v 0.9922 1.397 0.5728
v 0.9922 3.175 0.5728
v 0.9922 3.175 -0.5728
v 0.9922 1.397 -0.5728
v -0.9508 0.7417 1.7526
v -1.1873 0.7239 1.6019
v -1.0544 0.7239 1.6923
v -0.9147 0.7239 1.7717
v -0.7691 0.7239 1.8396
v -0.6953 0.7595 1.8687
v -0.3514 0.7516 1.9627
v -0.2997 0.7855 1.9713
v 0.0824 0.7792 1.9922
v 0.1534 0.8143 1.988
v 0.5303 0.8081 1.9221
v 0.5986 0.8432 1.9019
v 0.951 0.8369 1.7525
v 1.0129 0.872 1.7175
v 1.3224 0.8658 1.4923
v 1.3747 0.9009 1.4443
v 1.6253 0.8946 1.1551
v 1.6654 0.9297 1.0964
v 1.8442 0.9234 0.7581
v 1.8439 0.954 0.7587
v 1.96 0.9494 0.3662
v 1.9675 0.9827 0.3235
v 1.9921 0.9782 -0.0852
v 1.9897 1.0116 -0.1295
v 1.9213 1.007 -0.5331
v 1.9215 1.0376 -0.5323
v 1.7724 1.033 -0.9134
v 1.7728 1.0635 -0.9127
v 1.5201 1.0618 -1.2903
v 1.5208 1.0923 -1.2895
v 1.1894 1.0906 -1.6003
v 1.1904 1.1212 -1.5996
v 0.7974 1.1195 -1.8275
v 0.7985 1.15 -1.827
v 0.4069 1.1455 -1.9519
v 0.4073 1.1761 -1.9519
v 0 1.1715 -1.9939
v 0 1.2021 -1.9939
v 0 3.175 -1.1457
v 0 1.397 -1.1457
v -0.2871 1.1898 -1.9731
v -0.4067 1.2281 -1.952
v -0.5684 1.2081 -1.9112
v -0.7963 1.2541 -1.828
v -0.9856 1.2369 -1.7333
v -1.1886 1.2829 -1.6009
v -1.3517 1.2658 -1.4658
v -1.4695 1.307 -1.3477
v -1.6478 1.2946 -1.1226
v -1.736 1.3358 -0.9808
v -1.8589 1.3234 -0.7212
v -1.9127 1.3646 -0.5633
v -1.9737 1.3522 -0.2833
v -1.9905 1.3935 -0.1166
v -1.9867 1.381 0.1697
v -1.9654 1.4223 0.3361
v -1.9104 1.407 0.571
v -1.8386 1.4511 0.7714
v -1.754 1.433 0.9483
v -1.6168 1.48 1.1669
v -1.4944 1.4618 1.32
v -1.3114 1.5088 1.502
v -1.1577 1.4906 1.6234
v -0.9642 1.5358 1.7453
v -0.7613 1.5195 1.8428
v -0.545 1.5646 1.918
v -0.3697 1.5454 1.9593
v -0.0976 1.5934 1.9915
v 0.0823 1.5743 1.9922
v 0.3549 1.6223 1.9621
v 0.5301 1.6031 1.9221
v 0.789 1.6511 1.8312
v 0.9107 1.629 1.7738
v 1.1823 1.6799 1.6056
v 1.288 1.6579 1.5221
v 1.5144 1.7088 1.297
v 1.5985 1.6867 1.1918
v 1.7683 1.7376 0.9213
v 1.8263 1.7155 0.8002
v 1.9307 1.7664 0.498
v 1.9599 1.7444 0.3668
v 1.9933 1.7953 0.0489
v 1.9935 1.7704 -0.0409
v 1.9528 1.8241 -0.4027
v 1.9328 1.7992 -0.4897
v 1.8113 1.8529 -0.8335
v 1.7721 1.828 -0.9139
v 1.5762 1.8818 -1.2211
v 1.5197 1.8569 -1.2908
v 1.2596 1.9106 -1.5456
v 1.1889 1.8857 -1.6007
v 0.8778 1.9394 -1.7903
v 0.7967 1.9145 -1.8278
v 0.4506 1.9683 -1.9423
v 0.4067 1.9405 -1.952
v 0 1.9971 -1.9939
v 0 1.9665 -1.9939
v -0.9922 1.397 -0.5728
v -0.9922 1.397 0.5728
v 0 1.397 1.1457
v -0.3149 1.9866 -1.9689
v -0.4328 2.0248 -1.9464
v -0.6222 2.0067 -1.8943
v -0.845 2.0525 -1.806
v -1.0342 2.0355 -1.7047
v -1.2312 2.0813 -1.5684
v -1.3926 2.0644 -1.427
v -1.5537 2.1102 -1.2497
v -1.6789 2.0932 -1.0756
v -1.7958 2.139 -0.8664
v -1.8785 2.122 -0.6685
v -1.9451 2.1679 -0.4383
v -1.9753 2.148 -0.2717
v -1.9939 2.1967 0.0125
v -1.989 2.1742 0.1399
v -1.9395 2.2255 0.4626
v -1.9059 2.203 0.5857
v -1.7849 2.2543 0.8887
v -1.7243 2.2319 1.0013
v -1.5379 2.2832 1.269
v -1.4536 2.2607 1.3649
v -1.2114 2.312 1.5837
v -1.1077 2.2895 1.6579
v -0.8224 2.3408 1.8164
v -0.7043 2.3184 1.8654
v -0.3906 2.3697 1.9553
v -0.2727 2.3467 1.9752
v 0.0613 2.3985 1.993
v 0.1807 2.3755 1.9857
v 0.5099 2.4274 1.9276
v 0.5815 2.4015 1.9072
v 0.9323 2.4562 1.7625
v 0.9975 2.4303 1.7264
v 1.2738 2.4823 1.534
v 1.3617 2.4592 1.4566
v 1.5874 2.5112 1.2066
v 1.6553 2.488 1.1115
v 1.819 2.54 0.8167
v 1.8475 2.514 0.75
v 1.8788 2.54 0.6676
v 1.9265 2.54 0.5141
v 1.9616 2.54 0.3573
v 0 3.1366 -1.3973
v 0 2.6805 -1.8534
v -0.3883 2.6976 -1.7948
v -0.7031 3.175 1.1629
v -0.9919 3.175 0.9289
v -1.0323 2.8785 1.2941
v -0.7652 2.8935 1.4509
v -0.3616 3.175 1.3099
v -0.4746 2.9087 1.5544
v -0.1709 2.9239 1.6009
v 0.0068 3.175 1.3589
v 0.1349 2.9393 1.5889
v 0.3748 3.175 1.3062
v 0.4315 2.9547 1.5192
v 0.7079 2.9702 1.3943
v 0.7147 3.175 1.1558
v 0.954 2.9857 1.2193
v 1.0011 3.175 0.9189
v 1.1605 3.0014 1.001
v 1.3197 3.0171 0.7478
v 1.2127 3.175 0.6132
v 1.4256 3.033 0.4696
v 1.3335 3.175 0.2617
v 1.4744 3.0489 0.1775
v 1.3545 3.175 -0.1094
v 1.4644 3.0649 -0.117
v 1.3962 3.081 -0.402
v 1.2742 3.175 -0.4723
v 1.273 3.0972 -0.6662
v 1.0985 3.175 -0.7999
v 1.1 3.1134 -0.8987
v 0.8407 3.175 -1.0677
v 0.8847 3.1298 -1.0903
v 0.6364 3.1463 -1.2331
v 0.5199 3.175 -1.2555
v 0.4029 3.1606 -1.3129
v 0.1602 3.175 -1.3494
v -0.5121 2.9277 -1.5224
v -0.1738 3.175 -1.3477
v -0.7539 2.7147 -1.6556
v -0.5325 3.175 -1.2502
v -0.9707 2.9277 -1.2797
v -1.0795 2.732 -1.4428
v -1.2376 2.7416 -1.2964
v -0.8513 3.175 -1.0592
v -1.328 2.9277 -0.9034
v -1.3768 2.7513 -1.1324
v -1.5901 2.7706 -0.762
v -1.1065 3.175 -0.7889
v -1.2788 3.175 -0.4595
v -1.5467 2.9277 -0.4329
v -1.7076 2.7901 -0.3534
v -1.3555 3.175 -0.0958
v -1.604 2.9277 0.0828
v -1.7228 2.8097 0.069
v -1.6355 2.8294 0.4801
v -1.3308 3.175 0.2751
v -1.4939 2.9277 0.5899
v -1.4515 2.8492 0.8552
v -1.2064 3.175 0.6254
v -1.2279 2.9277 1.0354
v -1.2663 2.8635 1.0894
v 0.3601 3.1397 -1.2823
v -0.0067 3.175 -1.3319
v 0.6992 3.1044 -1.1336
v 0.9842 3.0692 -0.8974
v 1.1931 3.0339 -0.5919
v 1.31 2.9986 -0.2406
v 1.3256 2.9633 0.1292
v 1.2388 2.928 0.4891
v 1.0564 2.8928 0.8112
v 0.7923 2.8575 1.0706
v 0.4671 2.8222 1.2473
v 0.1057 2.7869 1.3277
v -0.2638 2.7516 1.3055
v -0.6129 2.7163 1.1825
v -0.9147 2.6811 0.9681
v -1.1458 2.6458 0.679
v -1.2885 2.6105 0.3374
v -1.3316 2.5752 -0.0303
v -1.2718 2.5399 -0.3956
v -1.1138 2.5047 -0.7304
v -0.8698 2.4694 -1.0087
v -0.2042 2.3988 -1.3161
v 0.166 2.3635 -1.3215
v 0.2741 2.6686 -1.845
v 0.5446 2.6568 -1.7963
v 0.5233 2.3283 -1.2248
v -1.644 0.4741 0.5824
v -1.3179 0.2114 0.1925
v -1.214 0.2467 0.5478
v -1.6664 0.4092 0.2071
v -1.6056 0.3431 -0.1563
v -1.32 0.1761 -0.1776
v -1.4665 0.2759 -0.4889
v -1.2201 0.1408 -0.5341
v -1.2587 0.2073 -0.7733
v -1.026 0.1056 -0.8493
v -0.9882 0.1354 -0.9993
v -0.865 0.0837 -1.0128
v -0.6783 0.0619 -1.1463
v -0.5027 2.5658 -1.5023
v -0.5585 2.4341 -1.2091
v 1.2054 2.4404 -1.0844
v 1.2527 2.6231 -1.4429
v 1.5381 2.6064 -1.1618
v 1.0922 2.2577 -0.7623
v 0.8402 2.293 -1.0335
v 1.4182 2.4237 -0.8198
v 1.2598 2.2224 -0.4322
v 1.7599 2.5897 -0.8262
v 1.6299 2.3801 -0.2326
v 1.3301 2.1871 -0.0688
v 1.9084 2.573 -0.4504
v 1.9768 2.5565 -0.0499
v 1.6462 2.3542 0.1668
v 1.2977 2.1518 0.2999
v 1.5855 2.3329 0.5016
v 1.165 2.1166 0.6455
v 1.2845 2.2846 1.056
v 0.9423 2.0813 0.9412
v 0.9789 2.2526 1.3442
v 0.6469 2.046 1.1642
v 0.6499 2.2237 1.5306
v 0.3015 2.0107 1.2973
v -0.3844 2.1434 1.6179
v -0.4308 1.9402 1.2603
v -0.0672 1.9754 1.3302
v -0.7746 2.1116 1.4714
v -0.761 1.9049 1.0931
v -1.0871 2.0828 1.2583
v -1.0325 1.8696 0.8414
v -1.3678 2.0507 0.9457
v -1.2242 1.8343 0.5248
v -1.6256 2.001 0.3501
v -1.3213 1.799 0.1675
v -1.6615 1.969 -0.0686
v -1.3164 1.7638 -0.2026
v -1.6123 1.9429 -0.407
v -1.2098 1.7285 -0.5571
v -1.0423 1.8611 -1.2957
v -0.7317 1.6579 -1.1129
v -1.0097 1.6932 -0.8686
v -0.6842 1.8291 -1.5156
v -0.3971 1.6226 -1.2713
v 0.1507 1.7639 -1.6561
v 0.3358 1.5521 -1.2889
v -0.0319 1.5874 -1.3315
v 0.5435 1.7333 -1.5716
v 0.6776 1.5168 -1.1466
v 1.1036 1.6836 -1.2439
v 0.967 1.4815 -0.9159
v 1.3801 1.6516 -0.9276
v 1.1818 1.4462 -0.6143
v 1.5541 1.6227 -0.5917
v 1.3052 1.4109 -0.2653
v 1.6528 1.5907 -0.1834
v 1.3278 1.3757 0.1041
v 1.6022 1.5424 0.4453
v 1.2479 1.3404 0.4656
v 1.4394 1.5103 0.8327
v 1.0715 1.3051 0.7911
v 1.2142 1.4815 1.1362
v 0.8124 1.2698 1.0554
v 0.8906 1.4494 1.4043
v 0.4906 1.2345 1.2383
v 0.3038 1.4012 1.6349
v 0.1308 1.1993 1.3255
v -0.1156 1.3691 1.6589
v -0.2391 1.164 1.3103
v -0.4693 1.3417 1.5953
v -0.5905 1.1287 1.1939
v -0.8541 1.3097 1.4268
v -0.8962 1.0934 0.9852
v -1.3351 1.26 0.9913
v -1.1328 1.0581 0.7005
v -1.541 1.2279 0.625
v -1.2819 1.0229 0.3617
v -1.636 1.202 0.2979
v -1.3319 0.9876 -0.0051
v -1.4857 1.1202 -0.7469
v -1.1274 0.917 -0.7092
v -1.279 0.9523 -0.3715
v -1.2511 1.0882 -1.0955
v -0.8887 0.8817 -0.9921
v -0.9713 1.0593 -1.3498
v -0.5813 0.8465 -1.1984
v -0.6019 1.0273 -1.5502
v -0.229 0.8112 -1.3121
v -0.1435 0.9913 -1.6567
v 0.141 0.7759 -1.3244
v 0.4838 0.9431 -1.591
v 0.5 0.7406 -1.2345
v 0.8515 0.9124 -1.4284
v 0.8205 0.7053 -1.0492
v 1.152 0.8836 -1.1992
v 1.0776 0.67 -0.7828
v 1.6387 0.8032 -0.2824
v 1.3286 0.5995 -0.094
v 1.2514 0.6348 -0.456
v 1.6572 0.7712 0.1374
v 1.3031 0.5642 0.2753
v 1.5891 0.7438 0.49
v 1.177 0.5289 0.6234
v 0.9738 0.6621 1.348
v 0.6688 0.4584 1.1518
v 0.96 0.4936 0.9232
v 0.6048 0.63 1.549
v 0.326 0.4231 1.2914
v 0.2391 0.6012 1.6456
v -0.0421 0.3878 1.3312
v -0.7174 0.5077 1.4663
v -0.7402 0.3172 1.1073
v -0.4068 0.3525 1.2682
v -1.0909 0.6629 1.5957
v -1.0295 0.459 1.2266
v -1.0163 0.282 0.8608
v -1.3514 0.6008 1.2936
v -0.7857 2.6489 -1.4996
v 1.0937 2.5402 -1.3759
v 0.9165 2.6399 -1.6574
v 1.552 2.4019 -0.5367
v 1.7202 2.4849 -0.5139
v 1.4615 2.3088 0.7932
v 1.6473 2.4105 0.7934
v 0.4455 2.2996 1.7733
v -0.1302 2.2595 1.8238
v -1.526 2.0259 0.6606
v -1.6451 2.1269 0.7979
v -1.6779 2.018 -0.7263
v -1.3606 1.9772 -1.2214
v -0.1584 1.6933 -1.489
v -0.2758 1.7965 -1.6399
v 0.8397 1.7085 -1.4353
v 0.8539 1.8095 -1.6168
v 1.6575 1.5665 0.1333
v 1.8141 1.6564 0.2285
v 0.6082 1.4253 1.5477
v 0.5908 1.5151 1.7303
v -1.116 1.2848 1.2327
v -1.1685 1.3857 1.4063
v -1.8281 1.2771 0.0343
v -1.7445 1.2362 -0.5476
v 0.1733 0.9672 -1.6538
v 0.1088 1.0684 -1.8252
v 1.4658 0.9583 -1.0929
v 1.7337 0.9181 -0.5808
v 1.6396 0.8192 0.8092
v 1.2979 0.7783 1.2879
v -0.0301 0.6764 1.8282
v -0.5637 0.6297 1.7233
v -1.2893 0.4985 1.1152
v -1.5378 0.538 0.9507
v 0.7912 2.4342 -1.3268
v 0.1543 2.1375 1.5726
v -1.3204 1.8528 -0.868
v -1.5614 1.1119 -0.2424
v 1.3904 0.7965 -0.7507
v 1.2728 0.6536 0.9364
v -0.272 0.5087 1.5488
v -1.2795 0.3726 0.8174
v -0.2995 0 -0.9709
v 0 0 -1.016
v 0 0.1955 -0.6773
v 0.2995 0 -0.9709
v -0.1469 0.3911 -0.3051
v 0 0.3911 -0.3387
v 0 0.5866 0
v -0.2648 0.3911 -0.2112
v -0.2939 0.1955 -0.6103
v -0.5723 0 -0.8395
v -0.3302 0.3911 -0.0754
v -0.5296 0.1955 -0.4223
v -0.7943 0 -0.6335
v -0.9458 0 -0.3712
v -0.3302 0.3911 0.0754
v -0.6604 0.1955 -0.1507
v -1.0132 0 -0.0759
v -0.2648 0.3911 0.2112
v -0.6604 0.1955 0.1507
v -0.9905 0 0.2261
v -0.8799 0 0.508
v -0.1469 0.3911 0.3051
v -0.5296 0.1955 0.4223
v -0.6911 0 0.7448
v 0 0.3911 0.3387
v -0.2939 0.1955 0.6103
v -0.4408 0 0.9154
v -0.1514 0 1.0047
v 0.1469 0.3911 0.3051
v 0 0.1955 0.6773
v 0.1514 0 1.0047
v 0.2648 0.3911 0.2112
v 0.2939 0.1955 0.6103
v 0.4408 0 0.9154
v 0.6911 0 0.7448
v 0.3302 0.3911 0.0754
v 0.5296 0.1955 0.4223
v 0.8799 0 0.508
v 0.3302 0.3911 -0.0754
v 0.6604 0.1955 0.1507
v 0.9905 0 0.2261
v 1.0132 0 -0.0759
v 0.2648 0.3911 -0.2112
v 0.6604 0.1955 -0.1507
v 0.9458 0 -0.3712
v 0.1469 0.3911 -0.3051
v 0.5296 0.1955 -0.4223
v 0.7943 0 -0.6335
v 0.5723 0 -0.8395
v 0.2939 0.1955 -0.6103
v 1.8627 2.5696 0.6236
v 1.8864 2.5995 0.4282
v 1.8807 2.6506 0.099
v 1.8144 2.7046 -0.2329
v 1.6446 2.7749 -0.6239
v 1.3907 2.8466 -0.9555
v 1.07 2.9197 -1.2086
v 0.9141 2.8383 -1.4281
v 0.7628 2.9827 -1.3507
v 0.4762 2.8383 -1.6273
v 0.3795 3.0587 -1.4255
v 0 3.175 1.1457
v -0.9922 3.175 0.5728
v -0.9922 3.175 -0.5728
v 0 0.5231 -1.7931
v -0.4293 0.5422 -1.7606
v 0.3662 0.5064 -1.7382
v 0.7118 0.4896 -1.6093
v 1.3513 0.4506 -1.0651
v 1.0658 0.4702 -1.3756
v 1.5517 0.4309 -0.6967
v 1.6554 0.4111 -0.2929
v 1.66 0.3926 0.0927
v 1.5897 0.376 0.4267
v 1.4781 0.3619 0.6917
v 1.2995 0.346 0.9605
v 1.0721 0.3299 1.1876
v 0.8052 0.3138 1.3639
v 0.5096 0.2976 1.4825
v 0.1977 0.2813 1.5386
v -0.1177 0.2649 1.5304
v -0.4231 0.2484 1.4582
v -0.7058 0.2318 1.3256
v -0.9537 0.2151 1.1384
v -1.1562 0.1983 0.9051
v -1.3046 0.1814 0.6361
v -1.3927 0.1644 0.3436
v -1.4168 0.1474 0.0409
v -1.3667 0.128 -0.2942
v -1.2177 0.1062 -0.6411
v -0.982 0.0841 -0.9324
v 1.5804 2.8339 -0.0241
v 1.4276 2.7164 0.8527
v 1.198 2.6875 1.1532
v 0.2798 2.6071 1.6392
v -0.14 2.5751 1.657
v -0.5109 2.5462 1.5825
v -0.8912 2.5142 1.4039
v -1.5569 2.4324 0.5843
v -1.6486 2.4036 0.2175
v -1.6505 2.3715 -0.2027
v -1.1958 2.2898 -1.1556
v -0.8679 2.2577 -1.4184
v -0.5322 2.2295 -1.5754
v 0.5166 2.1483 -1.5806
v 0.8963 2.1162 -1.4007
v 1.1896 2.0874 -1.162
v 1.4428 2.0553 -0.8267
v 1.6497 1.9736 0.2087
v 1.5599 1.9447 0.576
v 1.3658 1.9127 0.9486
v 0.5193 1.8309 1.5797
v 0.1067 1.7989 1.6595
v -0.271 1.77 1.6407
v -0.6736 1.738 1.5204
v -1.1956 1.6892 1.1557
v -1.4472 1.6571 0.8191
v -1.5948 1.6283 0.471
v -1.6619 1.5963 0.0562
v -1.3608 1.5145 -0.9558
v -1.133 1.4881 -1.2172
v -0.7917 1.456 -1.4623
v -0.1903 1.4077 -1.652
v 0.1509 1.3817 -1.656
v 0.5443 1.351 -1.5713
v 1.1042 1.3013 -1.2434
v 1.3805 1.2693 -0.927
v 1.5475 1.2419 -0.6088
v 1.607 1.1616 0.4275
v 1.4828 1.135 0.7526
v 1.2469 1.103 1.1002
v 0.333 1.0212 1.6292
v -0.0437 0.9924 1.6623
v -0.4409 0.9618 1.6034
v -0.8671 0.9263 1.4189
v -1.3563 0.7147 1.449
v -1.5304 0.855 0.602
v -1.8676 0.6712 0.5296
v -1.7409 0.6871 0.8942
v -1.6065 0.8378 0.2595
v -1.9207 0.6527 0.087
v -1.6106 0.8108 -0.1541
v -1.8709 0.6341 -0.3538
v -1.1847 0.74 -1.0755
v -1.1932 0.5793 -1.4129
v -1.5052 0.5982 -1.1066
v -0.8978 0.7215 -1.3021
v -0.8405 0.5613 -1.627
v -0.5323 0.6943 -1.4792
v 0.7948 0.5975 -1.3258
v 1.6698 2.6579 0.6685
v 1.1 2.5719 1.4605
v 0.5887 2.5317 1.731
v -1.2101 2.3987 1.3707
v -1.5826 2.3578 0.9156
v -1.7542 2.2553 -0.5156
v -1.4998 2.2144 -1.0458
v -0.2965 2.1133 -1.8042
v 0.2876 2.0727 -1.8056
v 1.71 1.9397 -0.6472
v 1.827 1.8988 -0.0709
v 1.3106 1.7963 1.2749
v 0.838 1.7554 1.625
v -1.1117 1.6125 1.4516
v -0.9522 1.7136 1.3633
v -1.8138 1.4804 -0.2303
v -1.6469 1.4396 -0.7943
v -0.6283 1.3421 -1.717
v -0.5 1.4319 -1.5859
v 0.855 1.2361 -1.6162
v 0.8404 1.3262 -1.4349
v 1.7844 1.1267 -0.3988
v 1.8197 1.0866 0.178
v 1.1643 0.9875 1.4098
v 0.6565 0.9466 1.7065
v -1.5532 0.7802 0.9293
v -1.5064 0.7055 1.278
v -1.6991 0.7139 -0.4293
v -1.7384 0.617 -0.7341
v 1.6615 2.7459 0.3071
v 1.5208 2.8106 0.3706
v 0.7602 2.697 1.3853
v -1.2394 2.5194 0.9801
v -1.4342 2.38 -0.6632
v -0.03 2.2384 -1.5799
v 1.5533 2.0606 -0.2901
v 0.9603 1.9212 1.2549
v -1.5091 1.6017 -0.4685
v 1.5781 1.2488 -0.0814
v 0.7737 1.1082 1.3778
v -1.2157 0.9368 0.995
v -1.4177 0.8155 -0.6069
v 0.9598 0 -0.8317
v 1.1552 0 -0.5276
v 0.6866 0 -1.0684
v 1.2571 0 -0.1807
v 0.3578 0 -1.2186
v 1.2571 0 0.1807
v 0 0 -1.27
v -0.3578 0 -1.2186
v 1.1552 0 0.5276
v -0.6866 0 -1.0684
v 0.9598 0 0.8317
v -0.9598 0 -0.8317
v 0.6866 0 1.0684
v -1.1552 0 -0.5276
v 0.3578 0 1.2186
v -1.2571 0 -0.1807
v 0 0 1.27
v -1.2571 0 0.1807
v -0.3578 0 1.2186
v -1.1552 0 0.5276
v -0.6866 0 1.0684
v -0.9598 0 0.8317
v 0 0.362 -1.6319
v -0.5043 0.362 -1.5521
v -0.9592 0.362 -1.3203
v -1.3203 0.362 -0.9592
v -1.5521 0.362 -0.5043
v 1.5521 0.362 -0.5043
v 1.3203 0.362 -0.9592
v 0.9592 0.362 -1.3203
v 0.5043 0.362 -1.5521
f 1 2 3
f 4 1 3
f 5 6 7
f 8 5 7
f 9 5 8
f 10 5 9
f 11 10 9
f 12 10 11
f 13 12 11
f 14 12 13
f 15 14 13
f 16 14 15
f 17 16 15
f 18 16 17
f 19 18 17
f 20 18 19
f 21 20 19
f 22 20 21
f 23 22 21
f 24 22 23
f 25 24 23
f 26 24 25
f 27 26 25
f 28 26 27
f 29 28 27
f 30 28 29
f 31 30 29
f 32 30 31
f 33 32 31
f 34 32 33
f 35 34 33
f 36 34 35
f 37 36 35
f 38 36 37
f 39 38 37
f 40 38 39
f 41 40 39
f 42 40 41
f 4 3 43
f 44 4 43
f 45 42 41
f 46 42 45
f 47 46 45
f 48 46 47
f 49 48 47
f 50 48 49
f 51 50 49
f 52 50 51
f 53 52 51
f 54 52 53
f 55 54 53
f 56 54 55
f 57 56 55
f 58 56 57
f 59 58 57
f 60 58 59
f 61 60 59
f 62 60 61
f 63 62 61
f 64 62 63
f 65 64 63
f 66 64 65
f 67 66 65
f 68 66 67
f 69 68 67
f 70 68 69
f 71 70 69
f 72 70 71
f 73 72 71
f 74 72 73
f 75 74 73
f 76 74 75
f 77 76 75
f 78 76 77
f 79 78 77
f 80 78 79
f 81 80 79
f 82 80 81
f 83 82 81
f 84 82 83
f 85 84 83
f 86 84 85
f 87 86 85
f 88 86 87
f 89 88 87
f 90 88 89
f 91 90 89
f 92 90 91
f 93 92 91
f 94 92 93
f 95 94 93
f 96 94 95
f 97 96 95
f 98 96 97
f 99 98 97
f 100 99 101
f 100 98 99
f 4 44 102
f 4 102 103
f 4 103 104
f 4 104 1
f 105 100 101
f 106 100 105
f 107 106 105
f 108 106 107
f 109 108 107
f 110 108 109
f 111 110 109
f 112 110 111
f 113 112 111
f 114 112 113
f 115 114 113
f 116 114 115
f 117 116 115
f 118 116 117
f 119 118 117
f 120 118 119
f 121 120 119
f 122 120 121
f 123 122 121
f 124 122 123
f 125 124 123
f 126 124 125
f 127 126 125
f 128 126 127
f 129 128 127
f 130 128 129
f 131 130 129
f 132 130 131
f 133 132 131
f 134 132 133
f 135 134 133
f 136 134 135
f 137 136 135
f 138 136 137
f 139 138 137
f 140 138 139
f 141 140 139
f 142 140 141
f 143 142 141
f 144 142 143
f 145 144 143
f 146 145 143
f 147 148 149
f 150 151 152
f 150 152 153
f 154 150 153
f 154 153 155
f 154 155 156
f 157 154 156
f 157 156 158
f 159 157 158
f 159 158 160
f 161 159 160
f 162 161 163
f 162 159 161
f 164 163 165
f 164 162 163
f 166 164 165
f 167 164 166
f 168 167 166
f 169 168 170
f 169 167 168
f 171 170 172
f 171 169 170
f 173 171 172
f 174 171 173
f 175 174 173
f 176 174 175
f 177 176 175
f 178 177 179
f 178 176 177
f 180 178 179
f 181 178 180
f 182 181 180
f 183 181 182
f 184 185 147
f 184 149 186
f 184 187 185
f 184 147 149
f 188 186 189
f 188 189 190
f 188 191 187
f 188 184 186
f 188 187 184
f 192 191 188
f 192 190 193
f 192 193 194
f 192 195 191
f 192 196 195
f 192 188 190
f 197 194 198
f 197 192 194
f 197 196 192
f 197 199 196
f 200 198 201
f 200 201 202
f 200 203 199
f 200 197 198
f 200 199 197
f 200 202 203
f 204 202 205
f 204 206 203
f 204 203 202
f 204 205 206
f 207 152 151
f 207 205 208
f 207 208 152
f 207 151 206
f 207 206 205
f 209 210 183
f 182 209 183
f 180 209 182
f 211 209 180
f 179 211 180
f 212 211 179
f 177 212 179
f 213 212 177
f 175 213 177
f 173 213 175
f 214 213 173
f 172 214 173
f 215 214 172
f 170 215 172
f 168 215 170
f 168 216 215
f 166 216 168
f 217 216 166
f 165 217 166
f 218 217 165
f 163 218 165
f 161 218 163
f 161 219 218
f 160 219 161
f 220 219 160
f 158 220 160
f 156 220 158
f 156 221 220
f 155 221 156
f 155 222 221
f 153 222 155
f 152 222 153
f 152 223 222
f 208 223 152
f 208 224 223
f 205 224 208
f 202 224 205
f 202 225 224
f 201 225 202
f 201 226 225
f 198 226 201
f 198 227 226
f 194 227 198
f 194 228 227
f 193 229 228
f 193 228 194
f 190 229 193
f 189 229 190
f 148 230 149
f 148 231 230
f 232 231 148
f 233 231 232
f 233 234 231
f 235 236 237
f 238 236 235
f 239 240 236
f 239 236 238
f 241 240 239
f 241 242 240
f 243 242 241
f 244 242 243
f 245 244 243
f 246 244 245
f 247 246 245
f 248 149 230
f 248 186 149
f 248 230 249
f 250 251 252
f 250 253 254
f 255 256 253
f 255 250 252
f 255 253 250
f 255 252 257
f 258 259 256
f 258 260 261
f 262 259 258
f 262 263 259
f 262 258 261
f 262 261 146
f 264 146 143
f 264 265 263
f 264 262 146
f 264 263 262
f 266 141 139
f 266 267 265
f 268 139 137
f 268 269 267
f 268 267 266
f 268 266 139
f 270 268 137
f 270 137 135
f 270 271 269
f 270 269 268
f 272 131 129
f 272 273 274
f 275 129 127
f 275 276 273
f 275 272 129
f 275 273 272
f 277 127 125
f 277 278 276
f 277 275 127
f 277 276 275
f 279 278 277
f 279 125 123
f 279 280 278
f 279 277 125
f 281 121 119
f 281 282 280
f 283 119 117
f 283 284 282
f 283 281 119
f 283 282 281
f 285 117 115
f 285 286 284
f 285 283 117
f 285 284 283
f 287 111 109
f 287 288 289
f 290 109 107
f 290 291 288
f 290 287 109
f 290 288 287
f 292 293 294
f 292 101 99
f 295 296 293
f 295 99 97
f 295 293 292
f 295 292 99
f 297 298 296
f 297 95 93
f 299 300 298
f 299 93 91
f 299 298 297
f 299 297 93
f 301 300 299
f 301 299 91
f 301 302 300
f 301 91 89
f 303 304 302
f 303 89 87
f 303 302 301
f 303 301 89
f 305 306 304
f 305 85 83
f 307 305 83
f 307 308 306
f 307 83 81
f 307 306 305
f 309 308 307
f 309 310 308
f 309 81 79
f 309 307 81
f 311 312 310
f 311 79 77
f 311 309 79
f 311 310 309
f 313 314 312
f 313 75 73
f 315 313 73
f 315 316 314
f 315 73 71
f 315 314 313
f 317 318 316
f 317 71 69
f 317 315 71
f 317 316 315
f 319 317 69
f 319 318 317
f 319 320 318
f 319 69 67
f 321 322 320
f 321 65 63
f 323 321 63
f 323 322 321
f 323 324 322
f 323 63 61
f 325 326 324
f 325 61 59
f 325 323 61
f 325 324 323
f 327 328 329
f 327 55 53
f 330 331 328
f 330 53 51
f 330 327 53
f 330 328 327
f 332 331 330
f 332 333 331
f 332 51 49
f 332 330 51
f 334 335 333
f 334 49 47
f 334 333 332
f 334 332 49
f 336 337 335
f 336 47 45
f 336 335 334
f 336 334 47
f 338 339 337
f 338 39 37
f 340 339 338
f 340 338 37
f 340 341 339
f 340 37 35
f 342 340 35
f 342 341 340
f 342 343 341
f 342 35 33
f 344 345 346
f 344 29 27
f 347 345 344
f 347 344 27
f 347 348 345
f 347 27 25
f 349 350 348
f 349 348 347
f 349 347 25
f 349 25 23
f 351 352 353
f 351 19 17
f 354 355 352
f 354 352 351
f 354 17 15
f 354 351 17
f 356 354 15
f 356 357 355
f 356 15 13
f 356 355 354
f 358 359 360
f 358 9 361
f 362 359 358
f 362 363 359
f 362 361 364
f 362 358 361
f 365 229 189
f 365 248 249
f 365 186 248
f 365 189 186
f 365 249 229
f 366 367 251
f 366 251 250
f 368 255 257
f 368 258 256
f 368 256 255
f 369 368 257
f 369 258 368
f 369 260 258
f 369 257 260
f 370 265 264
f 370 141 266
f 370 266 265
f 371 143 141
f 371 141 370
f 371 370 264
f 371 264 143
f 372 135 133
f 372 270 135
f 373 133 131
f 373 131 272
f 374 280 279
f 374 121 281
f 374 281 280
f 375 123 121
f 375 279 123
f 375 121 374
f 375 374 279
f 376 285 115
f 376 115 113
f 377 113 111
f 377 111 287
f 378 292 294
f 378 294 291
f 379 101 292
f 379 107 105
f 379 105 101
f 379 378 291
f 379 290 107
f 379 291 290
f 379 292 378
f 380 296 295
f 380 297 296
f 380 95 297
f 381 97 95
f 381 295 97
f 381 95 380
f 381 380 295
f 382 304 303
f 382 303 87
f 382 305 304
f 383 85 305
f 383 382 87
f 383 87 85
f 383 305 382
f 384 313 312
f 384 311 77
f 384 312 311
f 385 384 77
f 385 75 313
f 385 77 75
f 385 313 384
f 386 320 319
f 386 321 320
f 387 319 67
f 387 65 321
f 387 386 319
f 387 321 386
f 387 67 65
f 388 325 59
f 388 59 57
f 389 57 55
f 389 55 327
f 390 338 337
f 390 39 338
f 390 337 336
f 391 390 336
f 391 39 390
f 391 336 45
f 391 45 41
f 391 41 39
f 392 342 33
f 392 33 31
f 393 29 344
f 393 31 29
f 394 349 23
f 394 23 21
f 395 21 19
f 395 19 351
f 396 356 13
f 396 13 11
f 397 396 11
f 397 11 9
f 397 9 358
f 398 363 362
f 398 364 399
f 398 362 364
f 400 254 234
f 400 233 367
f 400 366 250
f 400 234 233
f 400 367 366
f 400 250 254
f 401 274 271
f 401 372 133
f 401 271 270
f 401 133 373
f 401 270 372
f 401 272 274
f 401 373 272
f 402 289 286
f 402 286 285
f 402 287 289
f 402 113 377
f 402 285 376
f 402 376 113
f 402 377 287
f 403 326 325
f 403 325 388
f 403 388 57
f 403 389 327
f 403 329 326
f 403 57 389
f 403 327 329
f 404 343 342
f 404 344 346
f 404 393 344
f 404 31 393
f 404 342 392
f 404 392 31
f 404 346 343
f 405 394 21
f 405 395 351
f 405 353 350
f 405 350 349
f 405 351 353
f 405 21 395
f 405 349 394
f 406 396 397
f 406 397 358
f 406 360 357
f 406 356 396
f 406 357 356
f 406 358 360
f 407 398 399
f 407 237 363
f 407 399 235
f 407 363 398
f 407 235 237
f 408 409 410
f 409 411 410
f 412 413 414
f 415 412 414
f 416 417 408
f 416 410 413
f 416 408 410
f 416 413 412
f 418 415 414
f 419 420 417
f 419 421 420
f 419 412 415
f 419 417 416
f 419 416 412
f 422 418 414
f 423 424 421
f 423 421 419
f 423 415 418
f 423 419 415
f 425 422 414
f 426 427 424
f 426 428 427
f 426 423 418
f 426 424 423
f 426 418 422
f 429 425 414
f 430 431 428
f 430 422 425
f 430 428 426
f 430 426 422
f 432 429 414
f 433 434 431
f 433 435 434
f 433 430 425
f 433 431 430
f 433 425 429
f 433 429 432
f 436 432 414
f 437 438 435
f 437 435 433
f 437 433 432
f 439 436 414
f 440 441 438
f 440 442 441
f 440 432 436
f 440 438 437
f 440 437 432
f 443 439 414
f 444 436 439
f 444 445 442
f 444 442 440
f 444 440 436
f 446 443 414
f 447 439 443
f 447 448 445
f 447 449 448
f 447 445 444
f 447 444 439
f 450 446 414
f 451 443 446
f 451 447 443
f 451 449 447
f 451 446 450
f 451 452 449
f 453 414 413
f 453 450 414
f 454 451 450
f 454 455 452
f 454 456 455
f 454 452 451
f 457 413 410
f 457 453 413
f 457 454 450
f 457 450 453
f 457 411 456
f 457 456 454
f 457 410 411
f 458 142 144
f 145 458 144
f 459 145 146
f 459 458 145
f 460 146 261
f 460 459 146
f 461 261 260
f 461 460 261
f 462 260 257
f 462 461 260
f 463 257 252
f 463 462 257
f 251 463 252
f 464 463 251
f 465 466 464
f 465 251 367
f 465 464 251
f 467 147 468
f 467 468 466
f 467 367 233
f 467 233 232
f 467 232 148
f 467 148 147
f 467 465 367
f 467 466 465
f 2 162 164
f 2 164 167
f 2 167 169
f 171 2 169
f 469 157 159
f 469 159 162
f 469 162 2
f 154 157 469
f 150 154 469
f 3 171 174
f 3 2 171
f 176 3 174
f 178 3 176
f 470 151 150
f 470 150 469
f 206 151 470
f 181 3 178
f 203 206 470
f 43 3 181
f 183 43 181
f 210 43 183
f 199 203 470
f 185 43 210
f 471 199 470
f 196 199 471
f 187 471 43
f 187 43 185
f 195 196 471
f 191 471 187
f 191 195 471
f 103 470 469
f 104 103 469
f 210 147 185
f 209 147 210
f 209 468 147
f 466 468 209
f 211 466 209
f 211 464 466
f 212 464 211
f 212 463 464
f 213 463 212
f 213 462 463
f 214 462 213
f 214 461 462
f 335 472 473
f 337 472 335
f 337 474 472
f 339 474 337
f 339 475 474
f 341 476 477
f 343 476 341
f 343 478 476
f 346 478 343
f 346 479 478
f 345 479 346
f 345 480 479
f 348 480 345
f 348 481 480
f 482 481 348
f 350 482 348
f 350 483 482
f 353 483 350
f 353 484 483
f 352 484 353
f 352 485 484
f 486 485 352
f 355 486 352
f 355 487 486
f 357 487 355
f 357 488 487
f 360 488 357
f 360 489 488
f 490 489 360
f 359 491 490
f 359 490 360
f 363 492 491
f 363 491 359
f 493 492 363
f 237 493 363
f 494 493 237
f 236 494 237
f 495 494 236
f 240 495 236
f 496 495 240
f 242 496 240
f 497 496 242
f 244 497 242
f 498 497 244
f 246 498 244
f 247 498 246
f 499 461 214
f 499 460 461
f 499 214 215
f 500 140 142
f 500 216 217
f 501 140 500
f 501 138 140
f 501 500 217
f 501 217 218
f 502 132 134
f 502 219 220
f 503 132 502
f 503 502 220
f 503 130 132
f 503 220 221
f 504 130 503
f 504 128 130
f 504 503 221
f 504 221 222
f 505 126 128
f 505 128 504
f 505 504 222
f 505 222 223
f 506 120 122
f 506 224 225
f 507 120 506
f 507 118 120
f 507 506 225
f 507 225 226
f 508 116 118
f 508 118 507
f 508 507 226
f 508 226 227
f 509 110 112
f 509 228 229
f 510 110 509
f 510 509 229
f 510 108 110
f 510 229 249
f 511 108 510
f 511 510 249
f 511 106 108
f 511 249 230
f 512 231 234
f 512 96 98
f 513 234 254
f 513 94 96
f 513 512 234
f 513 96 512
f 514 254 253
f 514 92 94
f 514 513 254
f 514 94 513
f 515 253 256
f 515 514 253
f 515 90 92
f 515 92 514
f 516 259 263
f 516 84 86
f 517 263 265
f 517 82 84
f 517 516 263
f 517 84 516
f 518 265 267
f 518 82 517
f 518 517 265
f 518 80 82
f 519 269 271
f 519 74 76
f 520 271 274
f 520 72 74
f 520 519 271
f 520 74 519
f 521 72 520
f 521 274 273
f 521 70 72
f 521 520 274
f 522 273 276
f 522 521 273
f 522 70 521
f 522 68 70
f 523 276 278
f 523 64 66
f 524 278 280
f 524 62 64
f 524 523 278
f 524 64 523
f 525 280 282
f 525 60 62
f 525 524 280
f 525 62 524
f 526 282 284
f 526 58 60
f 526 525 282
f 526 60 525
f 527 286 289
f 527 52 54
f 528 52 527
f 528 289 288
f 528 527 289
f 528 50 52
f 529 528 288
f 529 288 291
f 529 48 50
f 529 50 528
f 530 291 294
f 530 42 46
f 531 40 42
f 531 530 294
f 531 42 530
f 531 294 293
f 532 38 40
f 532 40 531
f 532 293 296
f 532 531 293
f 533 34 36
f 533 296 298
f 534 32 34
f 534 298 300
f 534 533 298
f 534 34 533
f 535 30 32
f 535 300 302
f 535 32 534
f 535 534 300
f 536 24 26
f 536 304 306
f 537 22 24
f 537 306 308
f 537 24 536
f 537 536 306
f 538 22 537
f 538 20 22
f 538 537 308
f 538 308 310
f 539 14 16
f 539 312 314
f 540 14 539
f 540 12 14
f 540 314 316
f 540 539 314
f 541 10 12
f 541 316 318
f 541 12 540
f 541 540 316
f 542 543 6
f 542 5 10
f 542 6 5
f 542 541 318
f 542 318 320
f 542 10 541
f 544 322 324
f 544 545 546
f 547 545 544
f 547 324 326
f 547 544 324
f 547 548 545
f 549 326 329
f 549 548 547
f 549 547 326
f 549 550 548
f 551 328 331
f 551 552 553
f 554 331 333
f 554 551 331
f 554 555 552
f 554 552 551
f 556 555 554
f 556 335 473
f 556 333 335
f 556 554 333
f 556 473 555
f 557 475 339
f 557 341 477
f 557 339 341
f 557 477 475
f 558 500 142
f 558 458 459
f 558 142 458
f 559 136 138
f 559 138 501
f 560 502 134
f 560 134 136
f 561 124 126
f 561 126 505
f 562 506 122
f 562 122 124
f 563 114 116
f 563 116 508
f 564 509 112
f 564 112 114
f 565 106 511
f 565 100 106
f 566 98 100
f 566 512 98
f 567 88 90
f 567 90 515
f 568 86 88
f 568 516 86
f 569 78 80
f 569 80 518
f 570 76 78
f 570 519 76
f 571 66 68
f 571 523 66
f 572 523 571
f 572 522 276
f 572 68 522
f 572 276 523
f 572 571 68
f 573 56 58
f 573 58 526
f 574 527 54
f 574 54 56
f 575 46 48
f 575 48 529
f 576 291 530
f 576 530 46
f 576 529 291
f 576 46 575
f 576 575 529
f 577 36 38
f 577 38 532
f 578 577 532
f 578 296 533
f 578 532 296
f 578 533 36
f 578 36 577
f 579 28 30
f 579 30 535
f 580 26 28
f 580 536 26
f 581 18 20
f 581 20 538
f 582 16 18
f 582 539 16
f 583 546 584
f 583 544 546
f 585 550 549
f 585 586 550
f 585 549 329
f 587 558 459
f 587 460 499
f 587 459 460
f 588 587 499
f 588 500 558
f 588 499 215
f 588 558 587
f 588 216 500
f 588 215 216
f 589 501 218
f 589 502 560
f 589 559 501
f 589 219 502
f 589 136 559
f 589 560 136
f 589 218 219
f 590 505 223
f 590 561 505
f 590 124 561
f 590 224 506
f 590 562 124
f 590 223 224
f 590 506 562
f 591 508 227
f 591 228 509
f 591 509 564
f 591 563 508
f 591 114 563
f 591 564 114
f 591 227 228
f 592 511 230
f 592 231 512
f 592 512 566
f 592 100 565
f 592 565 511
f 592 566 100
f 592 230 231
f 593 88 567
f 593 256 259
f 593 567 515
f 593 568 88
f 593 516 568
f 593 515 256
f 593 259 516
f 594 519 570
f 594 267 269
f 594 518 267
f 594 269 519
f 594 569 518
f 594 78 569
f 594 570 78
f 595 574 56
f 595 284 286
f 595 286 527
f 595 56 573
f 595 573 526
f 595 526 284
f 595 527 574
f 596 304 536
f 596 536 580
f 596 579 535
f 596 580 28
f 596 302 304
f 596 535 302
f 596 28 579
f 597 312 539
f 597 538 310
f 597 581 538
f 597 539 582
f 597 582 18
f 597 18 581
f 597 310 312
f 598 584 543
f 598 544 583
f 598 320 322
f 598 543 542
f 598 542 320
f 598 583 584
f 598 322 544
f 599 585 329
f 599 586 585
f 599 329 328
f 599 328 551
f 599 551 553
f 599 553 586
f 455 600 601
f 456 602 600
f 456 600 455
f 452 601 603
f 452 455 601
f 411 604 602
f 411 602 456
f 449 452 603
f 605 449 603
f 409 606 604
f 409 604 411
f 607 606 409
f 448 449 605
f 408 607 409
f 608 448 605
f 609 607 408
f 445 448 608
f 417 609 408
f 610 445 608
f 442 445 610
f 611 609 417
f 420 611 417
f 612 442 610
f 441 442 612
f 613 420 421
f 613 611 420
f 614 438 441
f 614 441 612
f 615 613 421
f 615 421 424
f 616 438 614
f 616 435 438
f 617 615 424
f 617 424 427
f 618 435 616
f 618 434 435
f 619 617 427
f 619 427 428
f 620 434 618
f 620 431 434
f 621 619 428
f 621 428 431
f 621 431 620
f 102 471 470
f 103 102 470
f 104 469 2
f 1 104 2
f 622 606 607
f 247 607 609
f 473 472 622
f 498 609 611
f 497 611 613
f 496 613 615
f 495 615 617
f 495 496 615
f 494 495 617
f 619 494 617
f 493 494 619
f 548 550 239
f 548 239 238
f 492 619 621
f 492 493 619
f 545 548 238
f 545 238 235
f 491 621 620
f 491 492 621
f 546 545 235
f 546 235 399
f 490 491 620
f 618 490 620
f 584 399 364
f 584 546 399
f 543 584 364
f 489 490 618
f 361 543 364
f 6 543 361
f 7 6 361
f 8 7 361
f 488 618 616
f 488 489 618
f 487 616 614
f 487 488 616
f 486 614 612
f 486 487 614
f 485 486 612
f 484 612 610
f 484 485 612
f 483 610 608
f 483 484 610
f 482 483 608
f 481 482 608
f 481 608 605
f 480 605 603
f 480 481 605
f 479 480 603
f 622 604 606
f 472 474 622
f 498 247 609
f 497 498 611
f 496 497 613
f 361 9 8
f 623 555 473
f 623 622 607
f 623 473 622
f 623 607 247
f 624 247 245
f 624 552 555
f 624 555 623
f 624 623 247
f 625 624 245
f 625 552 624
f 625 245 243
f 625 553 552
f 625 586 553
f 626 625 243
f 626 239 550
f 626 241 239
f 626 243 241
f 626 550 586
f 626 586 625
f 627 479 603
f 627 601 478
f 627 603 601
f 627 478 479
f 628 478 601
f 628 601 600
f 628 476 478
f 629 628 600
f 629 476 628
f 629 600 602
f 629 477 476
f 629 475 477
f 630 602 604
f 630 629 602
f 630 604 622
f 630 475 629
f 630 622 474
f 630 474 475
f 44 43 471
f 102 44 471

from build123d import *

# Parameters (mm, degrees)
CUT_EXTRUDE1_DEPTH     = 1.778
CUT_SWEEP3_PITCH       = 0.7950199999999968
CUT_SWEEP3_HEIGHT      = 9.525000000000002
CUT_SWEEP3_RADIUS      = 1.9938999999999998
CUT_SWEEP3_START_ANGLE = -180


with BuildPart() as part:
    # Sketch1 → Revolve1 (revolve)
    with BuildSketch(Plane.XY, mode=Mode.PRIVATE) as revolve1_sk:
        Polygon((0, 0.5865878734966664), (-1.016, 2e-17), (-1.2699999999999998, -2e-17), (-1.9938999999999998, 0.7239000000000022), (-1.9938999999999998, 2.5400000000000014), (-1.3588999999999998, 3.175), (7e-17, 3.175), align=None)
    revolve(revolve1_sk.sketch.rotate(Axis((0, 0, 0), (0, 1, 0)), 270), axis=Axis((0, 0, 0), (0, 1, 0)))

    # Sketch2 → Cut-Extrude1 (cut)
    with BuildSketch(Plane(origin=(0, 3.175, 0), x_dir=(1, 0, 0), z_dir=(0, 1, 0))):
        Polygon((-2.2e-16, 1.145679440423164), (-0.9921875000000002, 0.5728397202115824), (-0.9921875000000002, -0.5728397202115817), (-2.4e-16, -1.1456794404231636), (0.9921875, -0.5728397202115821), (0.9921874999999996, 0.5728397202115822), align=None)
    extrude(amount=-CUT_EXTRUDE1_DEPTH, mode=Mode.SUBTRACT)

    # Cut-Sweep3: sweep along a helix
    with BuildLine() as cut_sweep3_path:
        add(Helix(CUT_SWEEP3_PITCH, CUT_SWEEP3_HEIGHT, CUT_SWEEP3_RADIUS, center=(0, 3.175, 0), direction=(0, -1, 0), mode=Mode.PRIVATE).rotate(Axis((0, 3.175, 0), (0, -1, 0)), CUT_SWEEP3_START_ANGLE))
    with BuildLine() as cut_sweep3_axis:
        Line((0, 3.175, 0), (0, -6.350000000000002, 0))
    # Sketch4 → Cut-Sweep3 (sweep, cut)
    with BuildSketch(Plane(origin=(0, 0, 0), x_dir=(0, 0, -1), z_dir=(1, 0, 0))):
        Polygon((-2.0192999999999994, 3.968749999999999), (-2.0192999999999994, 3.175), (-1.3318923357460979, 3.5718749999999995), align=None)
    sweep(path=cut_sweep3_path.line, binormal=cut_sweep3_axis.edges()[0], mode=Mode.SUBTRACT)


solid = part.part
